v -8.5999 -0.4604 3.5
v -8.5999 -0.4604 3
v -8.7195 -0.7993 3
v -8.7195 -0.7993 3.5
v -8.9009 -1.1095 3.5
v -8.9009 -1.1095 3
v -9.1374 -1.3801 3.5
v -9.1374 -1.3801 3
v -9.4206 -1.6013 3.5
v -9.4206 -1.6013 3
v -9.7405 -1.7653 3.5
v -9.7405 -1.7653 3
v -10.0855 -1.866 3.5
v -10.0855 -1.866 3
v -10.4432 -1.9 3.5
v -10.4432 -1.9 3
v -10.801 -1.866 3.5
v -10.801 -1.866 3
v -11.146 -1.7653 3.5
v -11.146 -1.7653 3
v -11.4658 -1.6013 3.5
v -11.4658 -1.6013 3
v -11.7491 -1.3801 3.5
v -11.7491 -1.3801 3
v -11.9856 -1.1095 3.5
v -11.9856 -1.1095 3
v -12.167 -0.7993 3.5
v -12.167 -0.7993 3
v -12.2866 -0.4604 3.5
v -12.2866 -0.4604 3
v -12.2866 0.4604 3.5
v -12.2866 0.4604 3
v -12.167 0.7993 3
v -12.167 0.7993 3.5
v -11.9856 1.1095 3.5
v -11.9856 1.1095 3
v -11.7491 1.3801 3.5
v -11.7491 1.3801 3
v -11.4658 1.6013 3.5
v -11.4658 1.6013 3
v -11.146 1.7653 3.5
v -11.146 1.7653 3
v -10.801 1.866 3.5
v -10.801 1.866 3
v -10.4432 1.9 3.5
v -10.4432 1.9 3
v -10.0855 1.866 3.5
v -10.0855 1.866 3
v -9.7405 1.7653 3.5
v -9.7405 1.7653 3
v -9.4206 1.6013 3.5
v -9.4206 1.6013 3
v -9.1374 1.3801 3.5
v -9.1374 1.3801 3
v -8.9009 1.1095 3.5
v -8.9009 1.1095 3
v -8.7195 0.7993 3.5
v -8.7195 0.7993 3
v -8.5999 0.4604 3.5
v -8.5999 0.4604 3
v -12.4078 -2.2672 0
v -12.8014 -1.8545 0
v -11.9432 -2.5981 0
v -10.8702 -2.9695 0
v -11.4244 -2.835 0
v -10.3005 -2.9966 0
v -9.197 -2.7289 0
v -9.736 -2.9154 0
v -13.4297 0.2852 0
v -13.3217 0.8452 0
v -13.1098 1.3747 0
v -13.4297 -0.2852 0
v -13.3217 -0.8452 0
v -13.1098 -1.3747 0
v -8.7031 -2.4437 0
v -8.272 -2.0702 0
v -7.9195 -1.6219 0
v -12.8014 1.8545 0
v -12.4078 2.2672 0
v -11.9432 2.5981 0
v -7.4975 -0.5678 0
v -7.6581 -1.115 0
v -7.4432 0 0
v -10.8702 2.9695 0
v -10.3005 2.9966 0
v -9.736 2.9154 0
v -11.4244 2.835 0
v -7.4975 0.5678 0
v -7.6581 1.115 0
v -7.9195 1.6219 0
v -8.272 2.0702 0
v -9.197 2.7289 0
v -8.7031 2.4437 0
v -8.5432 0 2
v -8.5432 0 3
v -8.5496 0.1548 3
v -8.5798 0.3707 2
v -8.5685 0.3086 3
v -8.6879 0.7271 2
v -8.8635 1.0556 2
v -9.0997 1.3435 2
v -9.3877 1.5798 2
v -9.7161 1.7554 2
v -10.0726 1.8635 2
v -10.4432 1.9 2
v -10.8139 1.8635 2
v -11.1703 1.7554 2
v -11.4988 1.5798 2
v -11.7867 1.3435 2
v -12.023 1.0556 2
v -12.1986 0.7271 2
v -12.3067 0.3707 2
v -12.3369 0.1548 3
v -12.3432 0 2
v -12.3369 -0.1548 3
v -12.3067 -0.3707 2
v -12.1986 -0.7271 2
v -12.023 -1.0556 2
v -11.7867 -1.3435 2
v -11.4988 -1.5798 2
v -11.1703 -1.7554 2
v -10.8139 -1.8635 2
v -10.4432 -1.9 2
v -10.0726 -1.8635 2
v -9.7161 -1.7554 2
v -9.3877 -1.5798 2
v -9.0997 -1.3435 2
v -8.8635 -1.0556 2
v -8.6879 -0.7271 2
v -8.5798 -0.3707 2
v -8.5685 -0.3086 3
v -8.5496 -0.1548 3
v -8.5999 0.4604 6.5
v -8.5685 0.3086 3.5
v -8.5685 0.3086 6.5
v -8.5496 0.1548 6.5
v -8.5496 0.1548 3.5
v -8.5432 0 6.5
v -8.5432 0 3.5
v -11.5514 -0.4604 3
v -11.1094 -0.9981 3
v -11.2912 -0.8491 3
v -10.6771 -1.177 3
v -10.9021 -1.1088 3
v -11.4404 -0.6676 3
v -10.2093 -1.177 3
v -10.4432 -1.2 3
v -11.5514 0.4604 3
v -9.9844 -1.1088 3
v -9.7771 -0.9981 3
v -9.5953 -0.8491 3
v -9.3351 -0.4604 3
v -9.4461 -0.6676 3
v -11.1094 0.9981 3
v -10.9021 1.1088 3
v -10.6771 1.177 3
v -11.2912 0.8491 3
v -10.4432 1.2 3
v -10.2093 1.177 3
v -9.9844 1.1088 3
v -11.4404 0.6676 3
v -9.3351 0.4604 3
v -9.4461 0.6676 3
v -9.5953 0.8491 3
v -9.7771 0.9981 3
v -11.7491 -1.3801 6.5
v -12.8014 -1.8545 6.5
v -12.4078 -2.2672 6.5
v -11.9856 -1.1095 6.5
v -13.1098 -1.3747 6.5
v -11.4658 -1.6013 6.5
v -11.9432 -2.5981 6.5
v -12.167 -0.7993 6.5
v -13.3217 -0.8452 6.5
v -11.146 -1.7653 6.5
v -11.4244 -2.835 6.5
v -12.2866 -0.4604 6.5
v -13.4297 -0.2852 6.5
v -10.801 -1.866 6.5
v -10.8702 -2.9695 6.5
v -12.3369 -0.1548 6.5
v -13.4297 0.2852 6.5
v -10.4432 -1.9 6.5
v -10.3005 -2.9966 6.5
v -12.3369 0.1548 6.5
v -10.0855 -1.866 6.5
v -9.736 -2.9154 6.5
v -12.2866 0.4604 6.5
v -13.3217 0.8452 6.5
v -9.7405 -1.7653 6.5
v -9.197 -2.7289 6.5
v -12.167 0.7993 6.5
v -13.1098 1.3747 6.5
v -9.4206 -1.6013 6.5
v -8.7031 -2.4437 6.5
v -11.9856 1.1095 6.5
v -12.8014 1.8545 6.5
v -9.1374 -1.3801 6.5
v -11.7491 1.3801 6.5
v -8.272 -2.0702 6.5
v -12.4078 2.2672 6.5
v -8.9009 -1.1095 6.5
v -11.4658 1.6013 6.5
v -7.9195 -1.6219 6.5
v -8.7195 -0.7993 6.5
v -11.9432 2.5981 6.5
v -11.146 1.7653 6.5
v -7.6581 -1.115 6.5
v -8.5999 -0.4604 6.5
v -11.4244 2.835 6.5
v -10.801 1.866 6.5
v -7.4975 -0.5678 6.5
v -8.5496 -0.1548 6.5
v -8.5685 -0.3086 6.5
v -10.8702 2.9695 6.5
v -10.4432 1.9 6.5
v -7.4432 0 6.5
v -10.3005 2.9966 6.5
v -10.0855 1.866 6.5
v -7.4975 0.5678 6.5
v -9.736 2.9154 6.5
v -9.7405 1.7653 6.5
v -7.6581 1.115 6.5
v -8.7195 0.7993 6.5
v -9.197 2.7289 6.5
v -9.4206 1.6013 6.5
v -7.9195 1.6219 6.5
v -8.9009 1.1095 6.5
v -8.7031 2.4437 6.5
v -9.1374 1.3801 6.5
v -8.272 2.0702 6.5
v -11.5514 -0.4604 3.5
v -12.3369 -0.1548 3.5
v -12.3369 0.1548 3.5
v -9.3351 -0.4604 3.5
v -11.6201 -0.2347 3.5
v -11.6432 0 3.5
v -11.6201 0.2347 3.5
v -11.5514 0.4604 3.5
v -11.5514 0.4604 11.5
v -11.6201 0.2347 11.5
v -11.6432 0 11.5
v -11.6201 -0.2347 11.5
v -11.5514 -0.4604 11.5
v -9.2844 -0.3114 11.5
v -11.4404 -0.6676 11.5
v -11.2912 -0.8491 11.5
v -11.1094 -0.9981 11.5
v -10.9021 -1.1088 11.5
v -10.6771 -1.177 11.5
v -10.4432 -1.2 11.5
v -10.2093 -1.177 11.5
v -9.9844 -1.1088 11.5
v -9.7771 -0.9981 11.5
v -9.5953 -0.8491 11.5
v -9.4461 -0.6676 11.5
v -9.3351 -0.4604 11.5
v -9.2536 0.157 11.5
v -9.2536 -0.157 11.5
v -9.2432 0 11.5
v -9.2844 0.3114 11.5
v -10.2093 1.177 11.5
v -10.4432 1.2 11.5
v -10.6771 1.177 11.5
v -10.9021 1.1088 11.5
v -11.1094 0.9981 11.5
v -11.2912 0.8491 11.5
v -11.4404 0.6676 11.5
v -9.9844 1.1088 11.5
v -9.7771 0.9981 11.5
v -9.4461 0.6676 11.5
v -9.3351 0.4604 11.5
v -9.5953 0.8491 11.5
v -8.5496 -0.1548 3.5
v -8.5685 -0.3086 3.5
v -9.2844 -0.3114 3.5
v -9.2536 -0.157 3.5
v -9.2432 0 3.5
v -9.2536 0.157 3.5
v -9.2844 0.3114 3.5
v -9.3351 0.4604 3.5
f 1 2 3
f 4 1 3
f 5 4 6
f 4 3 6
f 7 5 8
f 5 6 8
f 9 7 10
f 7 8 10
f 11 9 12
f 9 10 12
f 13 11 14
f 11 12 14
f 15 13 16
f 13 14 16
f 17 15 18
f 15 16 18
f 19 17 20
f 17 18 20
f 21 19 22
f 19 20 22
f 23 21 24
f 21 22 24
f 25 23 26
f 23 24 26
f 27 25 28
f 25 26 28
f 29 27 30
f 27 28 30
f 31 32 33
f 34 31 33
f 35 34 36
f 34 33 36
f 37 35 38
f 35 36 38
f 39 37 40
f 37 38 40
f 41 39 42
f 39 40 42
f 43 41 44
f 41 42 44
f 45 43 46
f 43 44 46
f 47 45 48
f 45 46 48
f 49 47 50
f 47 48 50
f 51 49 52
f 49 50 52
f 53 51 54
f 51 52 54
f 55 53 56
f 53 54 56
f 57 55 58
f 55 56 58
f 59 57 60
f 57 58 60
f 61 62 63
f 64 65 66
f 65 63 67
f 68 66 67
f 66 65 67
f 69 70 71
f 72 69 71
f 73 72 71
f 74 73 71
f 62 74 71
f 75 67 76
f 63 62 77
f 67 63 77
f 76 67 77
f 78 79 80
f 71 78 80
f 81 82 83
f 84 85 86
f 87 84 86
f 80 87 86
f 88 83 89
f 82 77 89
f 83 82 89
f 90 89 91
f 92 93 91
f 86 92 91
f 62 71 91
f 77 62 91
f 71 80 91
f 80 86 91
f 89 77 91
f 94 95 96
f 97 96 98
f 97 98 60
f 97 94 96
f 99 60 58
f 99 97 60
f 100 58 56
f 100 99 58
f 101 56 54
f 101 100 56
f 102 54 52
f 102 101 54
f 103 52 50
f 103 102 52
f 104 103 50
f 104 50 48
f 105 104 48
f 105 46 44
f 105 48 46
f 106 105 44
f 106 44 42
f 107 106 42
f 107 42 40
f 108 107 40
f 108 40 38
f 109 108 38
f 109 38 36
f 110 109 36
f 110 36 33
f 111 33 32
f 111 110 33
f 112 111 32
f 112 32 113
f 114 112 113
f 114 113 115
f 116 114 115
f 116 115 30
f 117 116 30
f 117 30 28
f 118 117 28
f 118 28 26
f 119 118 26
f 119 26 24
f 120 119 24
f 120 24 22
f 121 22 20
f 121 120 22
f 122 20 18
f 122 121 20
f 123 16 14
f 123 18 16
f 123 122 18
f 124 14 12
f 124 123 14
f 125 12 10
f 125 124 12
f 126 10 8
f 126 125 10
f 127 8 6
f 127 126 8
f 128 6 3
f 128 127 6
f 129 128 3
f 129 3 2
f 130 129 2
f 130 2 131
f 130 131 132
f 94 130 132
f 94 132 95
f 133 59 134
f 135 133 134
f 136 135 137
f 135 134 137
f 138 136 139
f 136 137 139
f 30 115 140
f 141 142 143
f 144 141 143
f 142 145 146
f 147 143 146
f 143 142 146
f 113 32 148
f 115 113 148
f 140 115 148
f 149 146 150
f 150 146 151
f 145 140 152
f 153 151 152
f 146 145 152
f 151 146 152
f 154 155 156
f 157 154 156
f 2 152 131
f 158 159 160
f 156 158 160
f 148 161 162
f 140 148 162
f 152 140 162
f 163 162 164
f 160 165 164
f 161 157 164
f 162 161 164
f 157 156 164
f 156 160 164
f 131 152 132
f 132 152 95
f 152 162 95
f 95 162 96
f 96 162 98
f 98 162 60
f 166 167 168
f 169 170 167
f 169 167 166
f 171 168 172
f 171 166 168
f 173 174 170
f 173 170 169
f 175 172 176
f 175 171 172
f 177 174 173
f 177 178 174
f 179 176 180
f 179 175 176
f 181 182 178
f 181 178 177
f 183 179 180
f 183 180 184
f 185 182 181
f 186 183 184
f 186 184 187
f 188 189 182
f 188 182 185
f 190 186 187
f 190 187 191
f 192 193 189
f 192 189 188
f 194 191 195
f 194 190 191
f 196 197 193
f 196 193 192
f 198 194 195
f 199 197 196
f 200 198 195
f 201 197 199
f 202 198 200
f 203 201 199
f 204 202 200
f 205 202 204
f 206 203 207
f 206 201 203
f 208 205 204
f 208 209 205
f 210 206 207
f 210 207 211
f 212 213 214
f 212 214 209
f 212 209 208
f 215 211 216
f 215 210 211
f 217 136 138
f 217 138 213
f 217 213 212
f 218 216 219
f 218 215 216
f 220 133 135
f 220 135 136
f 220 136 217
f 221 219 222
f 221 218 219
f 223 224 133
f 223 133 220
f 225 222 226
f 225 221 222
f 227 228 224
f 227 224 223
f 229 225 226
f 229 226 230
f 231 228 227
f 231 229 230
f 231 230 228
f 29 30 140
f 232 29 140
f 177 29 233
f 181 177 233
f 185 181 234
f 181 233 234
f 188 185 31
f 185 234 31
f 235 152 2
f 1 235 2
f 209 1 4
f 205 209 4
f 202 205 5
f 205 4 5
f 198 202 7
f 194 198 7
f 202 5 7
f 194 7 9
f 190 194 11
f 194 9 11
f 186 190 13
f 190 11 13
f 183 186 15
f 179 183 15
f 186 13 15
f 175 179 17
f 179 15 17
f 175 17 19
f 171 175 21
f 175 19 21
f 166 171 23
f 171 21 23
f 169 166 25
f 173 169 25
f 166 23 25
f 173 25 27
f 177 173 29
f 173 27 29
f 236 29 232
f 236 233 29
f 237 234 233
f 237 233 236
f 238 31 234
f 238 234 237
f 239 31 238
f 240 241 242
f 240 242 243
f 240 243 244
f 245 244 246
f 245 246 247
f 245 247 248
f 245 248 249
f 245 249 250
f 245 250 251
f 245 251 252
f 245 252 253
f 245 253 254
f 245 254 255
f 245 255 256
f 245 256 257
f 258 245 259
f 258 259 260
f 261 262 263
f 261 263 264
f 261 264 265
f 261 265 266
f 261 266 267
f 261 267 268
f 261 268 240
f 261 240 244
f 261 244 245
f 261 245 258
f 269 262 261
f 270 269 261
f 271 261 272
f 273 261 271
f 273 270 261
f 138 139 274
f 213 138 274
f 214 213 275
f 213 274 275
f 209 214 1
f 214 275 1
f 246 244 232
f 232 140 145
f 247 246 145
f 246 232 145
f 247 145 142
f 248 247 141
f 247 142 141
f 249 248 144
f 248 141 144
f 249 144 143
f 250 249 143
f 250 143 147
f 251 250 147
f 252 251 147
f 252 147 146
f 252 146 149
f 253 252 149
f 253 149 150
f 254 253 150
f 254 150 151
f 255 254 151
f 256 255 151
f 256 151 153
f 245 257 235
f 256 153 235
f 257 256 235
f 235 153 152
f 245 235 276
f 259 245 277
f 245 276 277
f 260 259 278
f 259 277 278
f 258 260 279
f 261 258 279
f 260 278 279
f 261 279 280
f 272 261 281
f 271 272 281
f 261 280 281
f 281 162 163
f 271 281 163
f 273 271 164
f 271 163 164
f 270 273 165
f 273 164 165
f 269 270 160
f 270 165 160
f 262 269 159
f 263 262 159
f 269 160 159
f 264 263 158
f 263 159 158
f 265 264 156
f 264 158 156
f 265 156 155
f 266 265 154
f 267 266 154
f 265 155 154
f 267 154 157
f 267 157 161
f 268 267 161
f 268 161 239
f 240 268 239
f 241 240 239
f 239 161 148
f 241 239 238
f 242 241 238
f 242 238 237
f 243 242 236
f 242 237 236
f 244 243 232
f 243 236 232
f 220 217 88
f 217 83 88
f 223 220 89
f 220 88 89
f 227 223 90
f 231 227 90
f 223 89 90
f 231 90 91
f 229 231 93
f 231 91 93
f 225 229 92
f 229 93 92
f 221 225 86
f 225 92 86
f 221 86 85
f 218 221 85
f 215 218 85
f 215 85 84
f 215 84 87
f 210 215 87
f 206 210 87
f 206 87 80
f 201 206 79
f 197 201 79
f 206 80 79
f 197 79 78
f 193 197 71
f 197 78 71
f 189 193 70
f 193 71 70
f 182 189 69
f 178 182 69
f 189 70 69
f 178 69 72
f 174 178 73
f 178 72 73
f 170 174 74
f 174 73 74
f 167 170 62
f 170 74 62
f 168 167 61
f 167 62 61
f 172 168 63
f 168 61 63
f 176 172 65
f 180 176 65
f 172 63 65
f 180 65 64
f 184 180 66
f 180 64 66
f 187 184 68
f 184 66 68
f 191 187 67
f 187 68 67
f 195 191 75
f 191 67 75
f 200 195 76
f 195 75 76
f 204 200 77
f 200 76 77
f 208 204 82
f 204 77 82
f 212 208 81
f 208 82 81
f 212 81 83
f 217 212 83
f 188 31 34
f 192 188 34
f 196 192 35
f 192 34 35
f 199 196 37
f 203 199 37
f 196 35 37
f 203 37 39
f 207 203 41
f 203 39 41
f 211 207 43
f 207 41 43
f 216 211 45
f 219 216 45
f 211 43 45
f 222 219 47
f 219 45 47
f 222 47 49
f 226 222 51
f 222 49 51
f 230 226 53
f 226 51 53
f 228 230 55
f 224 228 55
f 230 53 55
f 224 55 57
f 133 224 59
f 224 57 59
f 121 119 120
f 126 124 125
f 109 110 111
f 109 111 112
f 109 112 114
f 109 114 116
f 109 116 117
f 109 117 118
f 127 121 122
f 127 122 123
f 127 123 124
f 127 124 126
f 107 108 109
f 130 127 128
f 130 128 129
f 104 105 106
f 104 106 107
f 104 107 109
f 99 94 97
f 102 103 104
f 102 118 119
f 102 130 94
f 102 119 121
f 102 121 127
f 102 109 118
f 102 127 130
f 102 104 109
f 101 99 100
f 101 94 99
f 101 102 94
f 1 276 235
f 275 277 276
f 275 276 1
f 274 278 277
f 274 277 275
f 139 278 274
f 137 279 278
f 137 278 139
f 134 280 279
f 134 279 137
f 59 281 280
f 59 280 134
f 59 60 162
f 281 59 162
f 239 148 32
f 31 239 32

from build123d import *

# Parameters (mm, degrees)
F0_R     = 3
F0_R_2   = 1.9
F0_R_3   = 1.2
F1_DEPTH = 2
F2_R     = 3
F2_R_2   = 1.9
F3_DEPTH = 1
F4_R     = 3
F5_DEPTH = 0.5
F6_R     = 3
F7_DEPTH = 3
F8_DEPTH = 5


with BuildPart() as f1:
    # F0 (on Top) → F1 (new body)
    with BuildSketch(Plane.XY):
        with Locations((-10.4432452041, 0)):
            Circle(F0_R)
        with Locations((-10.4432452041, 0)):
            Circle(F0_R_2, mode=Mode.SUBTRACT)
        with Locations((-10.4432452041, 0)):
            Circle(F0_R_2)
        with Locations((-10.4432452041, 0)):
            Circle(F0_R_3, mode=Mode.SUBTRACT)
        with Locations((-10.4432452041, 0)):
            Circle(F0_R_3)
    extrude(amount=F1_DEPTH)

    # F2 (on face) → F3 (join)
    with BuildSketch(Plane.XY.offset(2)):
        with Locations((-10.4432452041, 0)):
            Circle(F2_R)
        with Locations((-10.4432452041, 0)):
            Circle(F2_R_2, mode=Mode.SUBTRACT)
    extrude(amount=F3_DEPTH)

    # F4 (on face) → F5 (join)
    with BuildSketch(Plane.XY.offset(3)):
        with Locations((-10.4432452041, 0)):
            Circle(F4_R)
        with BuildLine():
            ThreePointArc((-12.2866257343, 0.4603783455), (-10.4432452041, 1.9), (-8.5998646739, 0.4603783455))
            Line((-8.5998646739, 0.4603783455), (-7.8815174605, 0.4603783455))
            Line((-7.8815174605, 0.4603783455), (-7.8815174605, -0.4603783455))
            Line((-7.8815174605, -0.4603783455), (-8.5998646739, -0.4603783455))
            ThreePointArc((-8.5998646739, -0.4603783455), (-10.4432452041, -1.9), (-12.2866257343, -0.4603783455))
            Line((-12.2866257343, -0.4603783455), (-12.7640617396, -0.4603783455))
            Line((-12.7640617396, -0.4603783455), (-12.7640617396, 0.4603783455))
            Line((-12.7640617396, 0.4603783455), (-12.2866257343, 0.4603783455))
        make_face(mode=Mode.SUBTRACT)
        with BuildLine():
            ThreePointArc((-12.2866257343, -0.4603783455), (-12.3432452041, 0), (-12.2866257343, 0.4603783455))
            Line((-12.2866257343, 0.4603783455), (-12.7640617396, 0.4603783455))
            Line((-12.7640617396, 0.4603783455), (-12.7640617396, -0.4603783455))
            Line((-12.7640617396, -0.4603783455), (-12.2866257343, -0.4603783455))
        make_face()
        with BuildLine():
            ThreePointArc((-11.5514201808, -0.4603783455), (-11.6432452041, 0), (-11.5514201808, 0.4603783455))
            Line((-11.5514201808, 0.4603783455), (-12.2866257343, 0.4603783455))
            ThreePointArc((-12.2866257343, 0.4603783455), (-12.3432452041, 0), (-12.2866257343, -0.4603783455))
            Line((-12.2866257343, -0.4603783455), (-11.5514201808, -0.4603783455))
        make_face()
        with BuildLine():
            ThreePointArc((-9.3350702274, -0.4603783455), (-9.2664253428, -0.234723271), (-9.2432452041, 0))
            ThreePointArc((-9.2432452041, 0), (-9.2664253428, 0.234723271), (-9.3350702274, 0.4603783455))
            Line((-9.3350702274, 0.4603783455), (-11.5514201808, 0.4603783455))
            ThreePointArc((-11.5514201808, 0.4603783455), (-11.6432452041, 0), (-11.5514201808, -0.4603783455))
            Line((-11.5514201808, -0.4603783455), (-9.3350702274, -0.4603783455))
        make_face()
        with BuildLine():
            Line((-11.5514201808, 0.4603783455), (-9.3350702274, 0.4603783455))
            ThreePointArc((-9.3350702274, 0.4603783455), (-10.4432452041, 1.2), (-11.5514201808, 0.4603783455))
        make_face()
        with BuildLine():
            ThreePointArc((-11.5514201808, -0.4603783455), (-10.4432452041, -1.2), (-9.3350702274, -0.4603783455))
            Line((-9.3350702274, -0.4603783455), (-11.5514201808, -0.4603783455))
        make_face()
        with BuildLine():
            ThreePointArc((-9.3350702274, 0.4603783455), (-9.2664253428, 0.234723271), (-9.2432452041, 0))
            ThreePointArc((-9.2432452041, 0), (-9.2664253428, -0.234723271), (-9.3350702274, -0.4603783455))
            Line((-9.3350702274, -0.4603783455), (-8.5998646739, -0.4603783455))
            ThreePointArc((-8.5998646739, -0.4603783455), (-8.5574531944, -0.2319234708), (-8.5432452041, 0))
            ThreePointArc((-8.5432452041, 0), (-8.5574531944, 0.2319234708), (-8.5998646739, 0.4603783455))
            Line((-8.5998646739, 0.4603783455), (-9.3350702274, 0.4603783455))
        make_face()
        with BuildLine():
            Line((-7.8815174605, 0.4603783455), (-8.5998646739, 0.4603783455))
            ThreePointArc((-8.5998646739, 0.4603783455), (-8.5574531944, 0.2319234708), (-8.5432452041, 0))
            ThreePointArc((-8.5432452041, 0), (-8.5574531944, -0.2319234708), (-8.5998646739, -0.4603783455))
            Line((-8.5998646739, -0.4603783455), (-7.8815174605, -0.4603783455))
            Line((-7.8815174605, -0.4603783455), (-7.8815174605, 0.4603783455))
        make_face()
    extrude(amount=F5_DEPTH)

    # F6 (on face) → F7 (join)
    with BuildSketch(Plane.XY.offset(3.5)):
        with Locations((-10.4432452041, 0)):
            Circle(F6_R)
        with BuildLine():
            ThreePointArc((-12.2866257343, 0.4603783455), (-10.4432452041, 1.9), (-8.5998646739, 0.4603783455))
            ThreePointArc((-8.5998646739, 0.4603783455), (-8.5574531944, 0.2319234708), (-8.5432452041, 0))
            ThreePointArc((-8.5432452041, 0), (-8.5574531944, -0.2319234708), (-8.5998646739, -0.4603783455))
            ThreePointArc((-8.5998646739, -0.4603783455), (-10.4432452041, -1.9), (-12.2866257343, -0.4603783455))
            ThreePointArc((-12.2866257343, -0.4603783455), (-12.3432452041, 0), (-12.2866257343, 0.4603783455))
        make_face(mode=Mode.SUBTRACT)
        with BuildLine():
            ThreePointArc((-9.3350702274, -0.4603783455), (-9.2664253428, -0.234723271), (-9.2432452041, 0))
            ThreePointArc((-9.2432452041, 0), (-9.2664253428, 0.234723271), (-9.3350702274, 0.4603783455))
            ThreePointArc((-9.3350702274, 0.4603783455), (-10.4432452041, 1.2), (-11.5514201808, 0.4603783455))
            ThreePointArc((-11.5514201808, 0.4603783455), (-11.6432452041, 0), (-11.5514201808, -0.4603783455))
            ThreePointArc((-11.5514201808, -0.4603783455), (-10.4432452041, -1.2), (-9.3350702274, -0.4603783455))
        make_face()
    extrude(amount=F7_DEPTH)

    # F8 (add): a face of the model
    f8_faces = [f1.faces().sort_by_distance(p)[0] for p in [
        (-10.4432452041, 0, 6.5),
    ]]
    extrude(f8_faces, amount=F8_DEPTH)


solid = f1.part
